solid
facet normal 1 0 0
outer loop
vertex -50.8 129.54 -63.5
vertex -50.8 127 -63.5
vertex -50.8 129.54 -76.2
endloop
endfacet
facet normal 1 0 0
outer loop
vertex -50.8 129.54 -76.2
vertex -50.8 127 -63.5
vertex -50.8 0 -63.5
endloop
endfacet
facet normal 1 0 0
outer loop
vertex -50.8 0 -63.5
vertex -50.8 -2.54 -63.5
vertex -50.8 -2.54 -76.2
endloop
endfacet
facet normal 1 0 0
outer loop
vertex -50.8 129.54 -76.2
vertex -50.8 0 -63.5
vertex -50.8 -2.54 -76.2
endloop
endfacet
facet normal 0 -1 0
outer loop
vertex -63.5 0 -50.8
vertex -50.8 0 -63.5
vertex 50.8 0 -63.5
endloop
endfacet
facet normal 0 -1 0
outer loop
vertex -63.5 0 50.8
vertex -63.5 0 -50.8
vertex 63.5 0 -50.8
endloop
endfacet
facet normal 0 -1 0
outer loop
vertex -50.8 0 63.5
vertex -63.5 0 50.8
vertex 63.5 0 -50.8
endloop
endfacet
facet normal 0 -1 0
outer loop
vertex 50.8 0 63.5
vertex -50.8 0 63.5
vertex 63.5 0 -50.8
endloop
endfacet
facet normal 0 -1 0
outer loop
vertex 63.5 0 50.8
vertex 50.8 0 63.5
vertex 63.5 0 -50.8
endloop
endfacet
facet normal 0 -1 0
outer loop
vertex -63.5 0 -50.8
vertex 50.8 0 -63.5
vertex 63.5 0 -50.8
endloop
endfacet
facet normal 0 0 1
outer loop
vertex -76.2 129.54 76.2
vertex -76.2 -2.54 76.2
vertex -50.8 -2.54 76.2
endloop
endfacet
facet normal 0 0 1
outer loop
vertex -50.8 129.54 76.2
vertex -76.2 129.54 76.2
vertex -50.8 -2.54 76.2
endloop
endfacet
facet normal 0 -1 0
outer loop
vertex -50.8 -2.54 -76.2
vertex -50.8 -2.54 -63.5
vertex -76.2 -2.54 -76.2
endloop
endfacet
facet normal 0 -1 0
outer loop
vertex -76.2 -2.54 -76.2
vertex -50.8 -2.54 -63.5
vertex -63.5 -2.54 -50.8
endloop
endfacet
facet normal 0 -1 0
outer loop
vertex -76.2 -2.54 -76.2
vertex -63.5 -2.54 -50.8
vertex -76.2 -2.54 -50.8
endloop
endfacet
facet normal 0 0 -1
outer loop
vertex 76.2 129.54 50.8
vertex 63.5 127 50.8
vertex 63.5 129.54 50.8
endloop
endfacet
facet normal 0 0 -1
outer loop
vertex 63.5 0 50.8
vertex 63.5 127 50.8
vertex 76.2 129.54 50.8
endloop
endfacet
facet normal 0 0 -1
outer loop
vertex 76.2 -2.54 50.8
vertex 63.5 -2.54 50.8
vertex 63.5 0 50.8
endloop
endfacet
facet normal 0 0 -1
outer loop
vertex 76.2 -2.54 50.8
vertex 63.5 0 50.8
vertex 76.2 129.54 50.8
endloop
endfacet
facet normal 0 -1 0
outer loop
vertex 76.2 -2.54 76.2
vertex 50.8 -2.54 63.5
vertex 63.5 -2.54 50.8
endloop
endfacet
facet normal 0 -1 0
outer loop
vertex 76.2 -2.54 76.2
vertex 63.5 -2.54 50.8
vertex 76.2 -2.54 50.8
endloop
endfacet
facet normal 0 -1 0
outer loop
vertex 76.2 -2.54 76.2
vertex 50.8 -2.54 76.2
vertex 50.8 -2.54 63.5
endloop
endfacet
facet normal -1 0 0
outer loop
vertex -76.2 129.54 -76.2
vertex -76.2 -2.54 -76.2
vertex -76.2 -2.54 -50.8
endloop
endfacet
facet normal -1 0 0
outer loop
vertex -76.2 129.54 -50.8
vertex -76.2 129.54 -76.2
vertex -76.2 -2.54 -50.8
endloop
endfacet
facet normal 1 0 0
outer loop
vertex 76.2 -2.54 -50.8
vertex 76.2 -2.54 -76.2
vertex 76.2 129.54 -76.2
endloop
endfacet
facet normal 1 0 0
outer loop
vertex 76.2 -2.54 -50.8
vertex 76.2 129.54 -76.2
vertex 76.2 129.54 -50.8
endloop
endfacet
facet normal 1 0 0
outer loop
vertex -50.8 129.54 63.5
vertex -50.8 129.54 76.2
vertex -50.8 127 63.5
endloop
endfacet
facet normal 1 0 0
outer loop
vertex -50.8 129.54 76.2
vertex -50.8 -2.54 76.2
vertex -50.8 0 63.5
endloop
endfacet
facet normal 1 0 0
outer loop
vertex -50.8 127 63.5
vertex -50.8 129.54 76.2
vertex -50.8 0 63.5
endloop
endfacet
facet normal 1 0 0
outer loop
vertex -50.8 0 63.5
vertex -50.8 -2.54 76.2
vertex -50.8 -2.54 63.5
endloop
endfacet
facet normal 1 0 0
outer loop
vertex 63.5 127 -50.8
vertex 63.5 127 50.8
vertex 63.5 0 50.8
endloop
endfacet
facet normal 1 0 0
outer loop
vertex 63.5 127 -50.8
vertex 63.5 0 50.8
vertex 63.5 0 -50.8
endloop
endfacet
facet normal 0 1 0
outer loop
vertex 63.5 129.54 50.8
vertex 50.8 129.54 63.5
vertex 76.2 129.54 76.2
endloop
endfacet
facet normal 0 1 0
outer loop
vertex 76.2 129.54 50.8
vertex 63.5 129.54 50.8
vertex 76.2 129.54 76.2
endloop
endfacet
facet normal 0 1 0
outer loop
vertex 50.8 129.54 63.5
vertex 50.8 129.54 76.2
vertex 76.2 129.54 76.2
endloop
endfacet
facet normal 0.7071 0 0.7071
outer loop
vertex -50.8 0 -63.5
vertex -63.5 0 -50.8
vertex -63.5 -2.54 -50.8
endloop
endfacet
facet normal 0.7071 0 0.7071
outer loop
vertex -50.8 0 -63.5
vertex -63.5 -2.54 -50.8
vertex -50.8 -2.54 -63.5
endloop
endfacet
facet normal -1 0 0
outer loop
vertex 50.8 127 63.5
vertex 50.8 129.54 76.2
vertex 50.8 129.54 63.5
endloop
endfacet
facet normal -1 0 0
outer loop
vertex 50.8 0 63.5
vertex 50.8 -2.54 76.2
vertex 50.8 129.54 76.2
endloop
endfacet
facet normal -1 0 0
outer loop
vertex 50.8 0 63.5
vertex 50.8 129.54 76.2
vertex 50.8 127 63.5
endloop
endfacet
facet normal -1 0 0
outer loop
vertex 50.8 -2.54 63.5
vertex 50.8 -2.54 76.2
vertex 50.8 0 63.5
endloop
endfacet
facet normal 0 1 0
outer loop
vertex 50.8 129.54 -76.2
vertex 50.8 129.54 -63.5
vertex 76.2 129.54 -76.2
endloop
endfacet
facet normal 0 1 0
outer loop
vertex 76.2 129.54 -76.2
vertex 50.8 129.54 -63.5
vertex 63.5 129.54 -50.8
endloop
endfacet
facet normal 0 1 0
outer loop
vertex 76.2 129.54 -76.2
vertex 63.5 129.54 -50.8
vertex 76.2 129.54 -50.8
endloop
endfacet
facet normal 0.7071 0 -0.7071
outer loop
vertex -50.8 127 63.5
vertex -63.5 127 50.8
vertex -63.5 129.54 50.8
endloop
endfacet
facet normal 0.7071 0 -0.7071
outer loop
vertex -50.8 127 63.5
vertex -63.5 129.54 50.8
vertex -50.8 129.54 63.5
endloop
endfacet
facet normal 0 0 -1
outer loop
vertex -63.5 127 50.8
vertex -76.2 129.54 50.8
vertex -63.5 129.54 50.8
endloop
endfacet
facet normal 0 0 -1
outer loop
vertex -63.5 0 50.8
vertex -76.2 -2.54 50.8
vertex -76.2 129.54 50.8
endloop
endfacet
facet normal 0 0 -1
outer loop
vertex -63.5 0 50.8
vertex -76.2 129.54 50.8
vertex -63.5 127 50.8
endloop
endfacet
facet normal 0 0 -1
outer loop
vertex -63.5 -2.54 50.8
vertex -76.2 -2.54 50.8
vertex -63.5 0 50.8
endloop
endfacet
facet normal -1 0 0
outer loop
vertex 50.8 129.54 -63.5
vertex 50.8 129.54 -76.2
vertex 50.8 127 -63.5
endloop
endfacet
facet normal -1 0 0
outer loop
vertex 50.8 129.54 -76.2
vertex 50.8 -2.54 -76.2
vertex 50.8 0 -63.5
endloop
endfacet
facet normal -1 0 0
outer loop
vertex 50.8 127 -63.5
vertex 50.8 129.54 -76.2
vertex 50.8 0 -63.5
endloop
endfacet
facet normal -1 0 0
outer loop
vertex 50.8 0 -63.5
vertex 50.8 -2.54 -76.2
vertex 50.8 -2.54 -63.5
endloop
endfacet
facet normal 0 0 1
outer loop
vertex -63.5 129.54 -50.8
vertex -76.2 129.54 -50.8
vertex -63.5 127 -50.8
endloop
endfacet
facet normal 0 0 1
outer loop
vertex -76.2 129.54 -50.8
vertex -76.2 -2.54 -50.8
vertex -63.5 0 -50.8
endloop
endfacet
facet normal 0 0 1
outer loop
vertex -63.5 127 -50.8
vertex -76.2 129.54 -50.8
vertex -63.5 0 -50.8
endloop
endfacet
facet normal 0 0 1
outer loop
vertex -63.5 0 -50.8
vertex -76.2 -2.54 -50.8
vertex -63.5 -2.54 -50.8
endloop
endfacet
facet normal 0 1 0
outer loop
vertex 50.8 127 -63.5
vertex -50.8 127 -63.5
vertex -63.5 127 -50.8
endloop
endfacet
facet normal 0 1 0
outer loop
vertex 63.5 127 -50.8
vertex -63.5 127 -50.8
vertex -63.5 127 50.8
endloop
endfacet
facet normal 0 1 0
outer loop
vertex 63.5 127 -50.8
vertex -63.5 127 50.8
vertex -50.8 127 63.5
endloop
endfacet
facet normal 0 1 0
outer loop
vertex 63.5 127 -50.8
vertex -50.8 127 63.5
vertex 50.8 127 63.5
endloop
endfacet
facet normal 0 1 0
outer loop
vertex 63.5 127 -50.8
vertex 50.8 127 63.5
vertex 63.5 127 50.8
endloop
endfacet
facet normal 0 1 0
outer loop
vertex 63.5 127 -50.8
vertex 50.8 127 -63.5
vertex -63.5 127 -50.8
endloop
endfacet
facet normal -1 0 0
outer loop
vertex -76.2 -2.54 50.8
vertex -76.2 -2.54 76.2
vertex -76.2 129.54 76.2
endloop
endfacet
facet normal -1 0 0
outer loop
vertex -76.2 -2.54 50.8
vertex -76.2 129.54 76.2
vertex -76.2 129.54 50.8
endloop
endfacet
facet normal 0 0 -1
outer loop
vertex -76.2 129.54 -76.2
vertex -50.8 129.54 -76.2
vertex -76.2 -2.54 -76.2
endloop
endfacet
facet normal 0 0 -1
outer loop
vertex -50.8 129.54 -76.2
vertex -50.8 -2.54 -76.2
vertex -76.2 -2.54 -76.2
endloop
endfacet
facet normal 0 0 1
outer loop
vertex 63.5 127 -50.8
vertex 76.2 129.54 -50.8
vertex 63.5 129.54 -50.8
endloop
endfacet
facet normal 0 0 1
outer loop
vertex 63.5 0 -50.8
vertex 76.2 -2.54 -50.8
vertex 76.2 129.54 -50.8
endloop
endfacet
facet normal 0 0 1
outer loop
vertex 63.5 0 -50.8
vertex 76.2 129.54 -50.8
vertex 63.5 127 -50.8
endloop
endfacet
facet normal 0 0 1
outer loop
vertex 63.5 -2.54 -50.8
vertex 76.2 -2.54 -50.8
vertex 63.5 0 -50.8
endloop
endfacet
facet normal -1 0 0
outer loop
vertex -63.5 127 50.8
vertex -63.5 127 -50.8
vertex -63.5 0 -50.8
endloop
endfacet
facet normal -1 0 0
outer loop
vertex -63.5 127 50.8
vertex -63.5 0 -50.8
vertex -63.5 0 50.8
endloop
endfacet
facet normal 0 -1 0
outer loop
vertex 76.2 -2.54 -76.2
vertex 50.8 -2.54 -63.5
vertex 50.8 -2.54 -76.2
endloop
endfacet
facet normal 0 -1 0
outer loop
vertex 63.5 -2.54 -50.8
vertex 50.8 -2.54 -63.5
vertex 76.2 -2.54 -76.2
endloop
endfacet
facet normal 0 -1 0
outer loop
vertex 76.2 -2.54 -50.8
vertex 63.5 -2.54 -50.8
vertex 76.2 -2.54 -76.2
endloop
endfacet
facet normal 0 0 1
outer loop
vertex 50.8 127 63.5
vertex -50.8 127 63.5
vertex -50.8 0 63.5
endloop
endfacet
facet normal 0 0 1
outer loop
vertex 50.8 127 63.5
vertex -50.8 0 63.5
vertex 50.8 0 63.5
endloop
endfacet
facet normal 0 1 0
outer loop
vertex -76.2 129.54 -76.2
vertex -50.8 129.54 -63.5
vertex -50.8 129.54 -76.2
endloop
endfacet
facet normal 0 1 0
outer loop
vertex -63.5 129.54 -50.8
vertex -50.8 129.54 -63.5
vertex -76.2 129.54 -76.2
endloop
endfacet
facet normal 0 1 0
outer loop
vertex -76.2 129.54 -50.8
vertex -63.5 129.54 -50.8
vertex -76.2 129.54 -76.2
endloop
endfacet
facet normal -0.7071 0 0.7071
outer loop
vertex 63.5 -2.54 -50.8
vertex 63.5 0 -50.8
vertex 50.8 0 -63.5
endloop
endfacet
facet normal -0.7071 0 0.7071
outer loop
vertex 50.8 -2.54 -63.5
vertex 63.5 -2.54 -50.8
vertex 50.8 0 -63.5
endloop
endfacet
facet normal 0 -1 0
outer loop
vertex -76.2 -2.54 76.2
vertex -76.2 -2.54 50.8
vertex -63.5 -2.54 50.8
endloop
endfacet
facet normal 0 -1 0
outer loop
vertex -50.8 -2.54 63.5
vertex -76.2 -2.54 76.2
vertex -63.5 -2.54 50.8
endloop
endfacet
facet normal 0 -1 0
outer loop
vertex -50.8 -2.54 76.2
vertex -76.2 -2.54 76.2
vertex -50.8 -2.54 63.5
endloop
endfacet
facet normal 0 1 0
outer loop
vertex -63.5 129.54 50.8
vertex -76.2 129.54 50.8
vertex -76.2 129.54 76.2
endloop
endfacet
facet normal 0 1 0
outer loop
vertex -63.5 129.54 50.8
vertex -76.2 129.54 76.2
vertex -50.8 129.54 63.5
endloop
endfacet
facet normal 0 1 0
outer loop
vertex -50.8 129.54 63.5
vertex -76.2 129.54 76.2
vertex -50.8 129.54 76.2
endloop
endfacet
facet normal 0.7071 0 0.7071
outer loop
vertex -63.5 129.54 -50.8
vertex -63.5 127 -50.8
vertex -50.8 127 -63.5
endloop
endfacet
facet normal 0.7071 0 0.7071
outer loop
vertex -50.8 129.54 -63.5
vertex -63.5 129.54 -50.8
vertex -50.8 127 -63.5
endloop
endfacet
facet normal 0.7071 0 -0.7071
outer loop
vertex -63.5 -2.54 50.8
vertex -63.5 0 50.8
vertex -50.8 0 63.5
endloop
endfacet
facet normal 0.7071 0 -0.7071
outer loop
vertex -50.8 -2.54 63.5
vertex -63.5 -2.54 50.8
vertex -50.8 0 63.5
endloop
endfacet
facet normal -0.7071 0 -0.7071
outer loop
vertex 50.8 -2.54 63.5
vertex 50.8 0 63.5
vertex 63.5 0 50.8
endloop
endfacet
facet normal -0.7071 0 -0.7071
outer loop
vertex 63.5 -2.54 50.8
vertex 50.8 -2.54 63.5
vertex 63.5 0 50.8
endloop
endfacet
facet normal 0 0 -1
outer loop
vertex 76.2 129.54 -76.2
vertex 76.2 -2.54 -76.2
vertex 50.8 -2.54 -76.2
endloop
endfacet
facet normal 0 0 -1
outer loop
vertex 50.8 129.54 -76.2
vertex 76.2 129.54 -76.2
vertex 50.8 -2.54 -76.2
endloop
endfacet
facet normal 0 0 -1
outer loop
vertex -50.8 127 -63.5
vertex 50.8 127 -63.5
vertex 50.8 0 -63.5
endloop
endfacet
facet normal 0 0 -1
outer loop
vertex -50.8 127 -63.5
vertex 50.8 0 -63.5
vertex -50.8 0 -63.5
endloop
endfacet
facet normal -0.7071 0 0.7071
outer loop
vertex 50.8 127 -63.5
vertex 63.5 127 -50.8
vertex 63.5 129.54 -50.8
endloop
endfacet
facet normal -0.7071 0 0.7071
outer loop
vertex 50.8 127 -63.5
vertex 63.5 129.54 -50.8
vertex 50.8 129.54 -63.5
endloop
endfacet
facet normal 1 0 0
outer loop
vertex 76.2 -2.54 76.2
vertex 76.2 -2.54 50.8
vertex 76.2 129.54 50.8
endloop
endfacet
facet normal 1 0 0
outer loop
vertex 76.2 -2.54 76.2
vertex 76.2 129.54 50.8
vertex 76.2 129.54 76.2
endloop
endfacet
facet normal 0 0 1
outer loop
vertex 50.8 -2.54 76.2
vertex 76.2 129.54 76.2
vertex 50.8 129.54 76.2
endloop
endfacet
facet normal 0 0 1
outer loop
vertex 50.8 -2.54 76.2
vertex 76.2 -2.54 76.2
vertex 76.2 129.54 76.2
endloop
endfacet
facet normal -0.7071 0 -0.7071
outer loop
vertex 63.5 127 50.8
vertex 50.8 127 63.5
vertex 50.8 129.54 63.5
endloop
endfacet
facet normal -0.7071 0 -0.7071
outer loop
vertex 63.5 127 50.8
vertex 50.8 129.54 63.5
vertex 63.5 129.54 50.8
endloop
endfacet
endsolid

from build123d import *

# Parameters (mm, degrees)
SKETCH1_W           = 12.7
SKETCH1_H           = 12.7
BOSS_EXTRUDE1_DEPTH = 127
BOSS_EXTRUDE2_DEPTH = 2.54


with BuildPart() as part:
    # Sketch1 → Boss-Extrude1 (new body)
    with BuildSketch(Plane(origin=(0, 0, 0), x_dir=(1, 0, 0), z_dir=(0, 1, 0))):
        Polygon((50.8, 63.5), (-50.8, 63.5), (-50.8, 50.8), (-63.5, 50.8), (-63.5, -50.8), (-50.8, -50.8), (-50.8, -63.5), (50.8, -63.5), (50.8, -50.8), (63.5, -50.8), (63.5, 50.8), (50.8, 50.8), align=None)
        with Locations((-57.15, -57.15)):
            Rectangle(SKETCH1_W, SKETCH1_H)
        Polygon((-63.5, -63.5), (-63.5, -50.8), (-76.2, -50.8), (-76.2, -76.2), (-50.8, -76.2), (-50.8, -63.5), align=None)
        with Locations((57.15, -57.15)):
            Rectangle(SKETCH1_W, SKETCH1_H)
        Polygon((76.2, -50.8), (63.5, -50.8), (63.5, -63.5), (50.8, -63.5), (50.8, -76.2), (76.2, -76.2), align=None)
        with Locations((57.15, 57.15)):
            Rectangle(SKETCH1_W, SKETCH1_H)
        Polygon((50.8, 76.2), (50.8, 63.5), (63.5, 63.5), (63.5, 50.8), (76.2, 50.8), (76.2, 76.2), align=None)
        Polygon((-63.5, 50.8), (-63.5, 63.5), (-50.8, 63.5), (-50.8, 76.2), (-76.2, 76.2), (-76.2, 50.8), align=None)
        with Locations((-57.15, 57.15)):
            Rectangle(SKETCH1_W, SKETCH1_H)
    extrude(amount=BOSS_EXTRUDE1_DEPTH)

    # Sketch2 → Boss-Extrude2 (add)
    with BuildSketch(Plane.XZ):
        Polygon((50.8, 63.5), (63.5, 50.8), (76.2, 50.8), (76.2, 76.2), (50.8, 76.2), align=None)
        Polygon((63.5, -50.8), (50.8, -63.5), (50.8, -76.2), (76.2, -76.2), (76.2, -50.8), align=None)
        Polygon((-63.5, -50.8), (-50.8, -63.5), (-50.8, -76.2), (-76.2, -76.2), (-76.2, -50.8), align=None)
        Polygon((-63.5, 50.8), (-50.8, 63.5), (-50.8, 76.2), (-76.2, 76.2), (-76.2, 50.8), align=None)
    boss_extrude2 = extrude(amount=BOSS_EXTRUDE2_DEPTH)

    # Mirror1: Boss-Extrude2 across plane
    add(boss_extrude2.mirror(Plane.ZX.offset(63.5)))


solid = part.part
